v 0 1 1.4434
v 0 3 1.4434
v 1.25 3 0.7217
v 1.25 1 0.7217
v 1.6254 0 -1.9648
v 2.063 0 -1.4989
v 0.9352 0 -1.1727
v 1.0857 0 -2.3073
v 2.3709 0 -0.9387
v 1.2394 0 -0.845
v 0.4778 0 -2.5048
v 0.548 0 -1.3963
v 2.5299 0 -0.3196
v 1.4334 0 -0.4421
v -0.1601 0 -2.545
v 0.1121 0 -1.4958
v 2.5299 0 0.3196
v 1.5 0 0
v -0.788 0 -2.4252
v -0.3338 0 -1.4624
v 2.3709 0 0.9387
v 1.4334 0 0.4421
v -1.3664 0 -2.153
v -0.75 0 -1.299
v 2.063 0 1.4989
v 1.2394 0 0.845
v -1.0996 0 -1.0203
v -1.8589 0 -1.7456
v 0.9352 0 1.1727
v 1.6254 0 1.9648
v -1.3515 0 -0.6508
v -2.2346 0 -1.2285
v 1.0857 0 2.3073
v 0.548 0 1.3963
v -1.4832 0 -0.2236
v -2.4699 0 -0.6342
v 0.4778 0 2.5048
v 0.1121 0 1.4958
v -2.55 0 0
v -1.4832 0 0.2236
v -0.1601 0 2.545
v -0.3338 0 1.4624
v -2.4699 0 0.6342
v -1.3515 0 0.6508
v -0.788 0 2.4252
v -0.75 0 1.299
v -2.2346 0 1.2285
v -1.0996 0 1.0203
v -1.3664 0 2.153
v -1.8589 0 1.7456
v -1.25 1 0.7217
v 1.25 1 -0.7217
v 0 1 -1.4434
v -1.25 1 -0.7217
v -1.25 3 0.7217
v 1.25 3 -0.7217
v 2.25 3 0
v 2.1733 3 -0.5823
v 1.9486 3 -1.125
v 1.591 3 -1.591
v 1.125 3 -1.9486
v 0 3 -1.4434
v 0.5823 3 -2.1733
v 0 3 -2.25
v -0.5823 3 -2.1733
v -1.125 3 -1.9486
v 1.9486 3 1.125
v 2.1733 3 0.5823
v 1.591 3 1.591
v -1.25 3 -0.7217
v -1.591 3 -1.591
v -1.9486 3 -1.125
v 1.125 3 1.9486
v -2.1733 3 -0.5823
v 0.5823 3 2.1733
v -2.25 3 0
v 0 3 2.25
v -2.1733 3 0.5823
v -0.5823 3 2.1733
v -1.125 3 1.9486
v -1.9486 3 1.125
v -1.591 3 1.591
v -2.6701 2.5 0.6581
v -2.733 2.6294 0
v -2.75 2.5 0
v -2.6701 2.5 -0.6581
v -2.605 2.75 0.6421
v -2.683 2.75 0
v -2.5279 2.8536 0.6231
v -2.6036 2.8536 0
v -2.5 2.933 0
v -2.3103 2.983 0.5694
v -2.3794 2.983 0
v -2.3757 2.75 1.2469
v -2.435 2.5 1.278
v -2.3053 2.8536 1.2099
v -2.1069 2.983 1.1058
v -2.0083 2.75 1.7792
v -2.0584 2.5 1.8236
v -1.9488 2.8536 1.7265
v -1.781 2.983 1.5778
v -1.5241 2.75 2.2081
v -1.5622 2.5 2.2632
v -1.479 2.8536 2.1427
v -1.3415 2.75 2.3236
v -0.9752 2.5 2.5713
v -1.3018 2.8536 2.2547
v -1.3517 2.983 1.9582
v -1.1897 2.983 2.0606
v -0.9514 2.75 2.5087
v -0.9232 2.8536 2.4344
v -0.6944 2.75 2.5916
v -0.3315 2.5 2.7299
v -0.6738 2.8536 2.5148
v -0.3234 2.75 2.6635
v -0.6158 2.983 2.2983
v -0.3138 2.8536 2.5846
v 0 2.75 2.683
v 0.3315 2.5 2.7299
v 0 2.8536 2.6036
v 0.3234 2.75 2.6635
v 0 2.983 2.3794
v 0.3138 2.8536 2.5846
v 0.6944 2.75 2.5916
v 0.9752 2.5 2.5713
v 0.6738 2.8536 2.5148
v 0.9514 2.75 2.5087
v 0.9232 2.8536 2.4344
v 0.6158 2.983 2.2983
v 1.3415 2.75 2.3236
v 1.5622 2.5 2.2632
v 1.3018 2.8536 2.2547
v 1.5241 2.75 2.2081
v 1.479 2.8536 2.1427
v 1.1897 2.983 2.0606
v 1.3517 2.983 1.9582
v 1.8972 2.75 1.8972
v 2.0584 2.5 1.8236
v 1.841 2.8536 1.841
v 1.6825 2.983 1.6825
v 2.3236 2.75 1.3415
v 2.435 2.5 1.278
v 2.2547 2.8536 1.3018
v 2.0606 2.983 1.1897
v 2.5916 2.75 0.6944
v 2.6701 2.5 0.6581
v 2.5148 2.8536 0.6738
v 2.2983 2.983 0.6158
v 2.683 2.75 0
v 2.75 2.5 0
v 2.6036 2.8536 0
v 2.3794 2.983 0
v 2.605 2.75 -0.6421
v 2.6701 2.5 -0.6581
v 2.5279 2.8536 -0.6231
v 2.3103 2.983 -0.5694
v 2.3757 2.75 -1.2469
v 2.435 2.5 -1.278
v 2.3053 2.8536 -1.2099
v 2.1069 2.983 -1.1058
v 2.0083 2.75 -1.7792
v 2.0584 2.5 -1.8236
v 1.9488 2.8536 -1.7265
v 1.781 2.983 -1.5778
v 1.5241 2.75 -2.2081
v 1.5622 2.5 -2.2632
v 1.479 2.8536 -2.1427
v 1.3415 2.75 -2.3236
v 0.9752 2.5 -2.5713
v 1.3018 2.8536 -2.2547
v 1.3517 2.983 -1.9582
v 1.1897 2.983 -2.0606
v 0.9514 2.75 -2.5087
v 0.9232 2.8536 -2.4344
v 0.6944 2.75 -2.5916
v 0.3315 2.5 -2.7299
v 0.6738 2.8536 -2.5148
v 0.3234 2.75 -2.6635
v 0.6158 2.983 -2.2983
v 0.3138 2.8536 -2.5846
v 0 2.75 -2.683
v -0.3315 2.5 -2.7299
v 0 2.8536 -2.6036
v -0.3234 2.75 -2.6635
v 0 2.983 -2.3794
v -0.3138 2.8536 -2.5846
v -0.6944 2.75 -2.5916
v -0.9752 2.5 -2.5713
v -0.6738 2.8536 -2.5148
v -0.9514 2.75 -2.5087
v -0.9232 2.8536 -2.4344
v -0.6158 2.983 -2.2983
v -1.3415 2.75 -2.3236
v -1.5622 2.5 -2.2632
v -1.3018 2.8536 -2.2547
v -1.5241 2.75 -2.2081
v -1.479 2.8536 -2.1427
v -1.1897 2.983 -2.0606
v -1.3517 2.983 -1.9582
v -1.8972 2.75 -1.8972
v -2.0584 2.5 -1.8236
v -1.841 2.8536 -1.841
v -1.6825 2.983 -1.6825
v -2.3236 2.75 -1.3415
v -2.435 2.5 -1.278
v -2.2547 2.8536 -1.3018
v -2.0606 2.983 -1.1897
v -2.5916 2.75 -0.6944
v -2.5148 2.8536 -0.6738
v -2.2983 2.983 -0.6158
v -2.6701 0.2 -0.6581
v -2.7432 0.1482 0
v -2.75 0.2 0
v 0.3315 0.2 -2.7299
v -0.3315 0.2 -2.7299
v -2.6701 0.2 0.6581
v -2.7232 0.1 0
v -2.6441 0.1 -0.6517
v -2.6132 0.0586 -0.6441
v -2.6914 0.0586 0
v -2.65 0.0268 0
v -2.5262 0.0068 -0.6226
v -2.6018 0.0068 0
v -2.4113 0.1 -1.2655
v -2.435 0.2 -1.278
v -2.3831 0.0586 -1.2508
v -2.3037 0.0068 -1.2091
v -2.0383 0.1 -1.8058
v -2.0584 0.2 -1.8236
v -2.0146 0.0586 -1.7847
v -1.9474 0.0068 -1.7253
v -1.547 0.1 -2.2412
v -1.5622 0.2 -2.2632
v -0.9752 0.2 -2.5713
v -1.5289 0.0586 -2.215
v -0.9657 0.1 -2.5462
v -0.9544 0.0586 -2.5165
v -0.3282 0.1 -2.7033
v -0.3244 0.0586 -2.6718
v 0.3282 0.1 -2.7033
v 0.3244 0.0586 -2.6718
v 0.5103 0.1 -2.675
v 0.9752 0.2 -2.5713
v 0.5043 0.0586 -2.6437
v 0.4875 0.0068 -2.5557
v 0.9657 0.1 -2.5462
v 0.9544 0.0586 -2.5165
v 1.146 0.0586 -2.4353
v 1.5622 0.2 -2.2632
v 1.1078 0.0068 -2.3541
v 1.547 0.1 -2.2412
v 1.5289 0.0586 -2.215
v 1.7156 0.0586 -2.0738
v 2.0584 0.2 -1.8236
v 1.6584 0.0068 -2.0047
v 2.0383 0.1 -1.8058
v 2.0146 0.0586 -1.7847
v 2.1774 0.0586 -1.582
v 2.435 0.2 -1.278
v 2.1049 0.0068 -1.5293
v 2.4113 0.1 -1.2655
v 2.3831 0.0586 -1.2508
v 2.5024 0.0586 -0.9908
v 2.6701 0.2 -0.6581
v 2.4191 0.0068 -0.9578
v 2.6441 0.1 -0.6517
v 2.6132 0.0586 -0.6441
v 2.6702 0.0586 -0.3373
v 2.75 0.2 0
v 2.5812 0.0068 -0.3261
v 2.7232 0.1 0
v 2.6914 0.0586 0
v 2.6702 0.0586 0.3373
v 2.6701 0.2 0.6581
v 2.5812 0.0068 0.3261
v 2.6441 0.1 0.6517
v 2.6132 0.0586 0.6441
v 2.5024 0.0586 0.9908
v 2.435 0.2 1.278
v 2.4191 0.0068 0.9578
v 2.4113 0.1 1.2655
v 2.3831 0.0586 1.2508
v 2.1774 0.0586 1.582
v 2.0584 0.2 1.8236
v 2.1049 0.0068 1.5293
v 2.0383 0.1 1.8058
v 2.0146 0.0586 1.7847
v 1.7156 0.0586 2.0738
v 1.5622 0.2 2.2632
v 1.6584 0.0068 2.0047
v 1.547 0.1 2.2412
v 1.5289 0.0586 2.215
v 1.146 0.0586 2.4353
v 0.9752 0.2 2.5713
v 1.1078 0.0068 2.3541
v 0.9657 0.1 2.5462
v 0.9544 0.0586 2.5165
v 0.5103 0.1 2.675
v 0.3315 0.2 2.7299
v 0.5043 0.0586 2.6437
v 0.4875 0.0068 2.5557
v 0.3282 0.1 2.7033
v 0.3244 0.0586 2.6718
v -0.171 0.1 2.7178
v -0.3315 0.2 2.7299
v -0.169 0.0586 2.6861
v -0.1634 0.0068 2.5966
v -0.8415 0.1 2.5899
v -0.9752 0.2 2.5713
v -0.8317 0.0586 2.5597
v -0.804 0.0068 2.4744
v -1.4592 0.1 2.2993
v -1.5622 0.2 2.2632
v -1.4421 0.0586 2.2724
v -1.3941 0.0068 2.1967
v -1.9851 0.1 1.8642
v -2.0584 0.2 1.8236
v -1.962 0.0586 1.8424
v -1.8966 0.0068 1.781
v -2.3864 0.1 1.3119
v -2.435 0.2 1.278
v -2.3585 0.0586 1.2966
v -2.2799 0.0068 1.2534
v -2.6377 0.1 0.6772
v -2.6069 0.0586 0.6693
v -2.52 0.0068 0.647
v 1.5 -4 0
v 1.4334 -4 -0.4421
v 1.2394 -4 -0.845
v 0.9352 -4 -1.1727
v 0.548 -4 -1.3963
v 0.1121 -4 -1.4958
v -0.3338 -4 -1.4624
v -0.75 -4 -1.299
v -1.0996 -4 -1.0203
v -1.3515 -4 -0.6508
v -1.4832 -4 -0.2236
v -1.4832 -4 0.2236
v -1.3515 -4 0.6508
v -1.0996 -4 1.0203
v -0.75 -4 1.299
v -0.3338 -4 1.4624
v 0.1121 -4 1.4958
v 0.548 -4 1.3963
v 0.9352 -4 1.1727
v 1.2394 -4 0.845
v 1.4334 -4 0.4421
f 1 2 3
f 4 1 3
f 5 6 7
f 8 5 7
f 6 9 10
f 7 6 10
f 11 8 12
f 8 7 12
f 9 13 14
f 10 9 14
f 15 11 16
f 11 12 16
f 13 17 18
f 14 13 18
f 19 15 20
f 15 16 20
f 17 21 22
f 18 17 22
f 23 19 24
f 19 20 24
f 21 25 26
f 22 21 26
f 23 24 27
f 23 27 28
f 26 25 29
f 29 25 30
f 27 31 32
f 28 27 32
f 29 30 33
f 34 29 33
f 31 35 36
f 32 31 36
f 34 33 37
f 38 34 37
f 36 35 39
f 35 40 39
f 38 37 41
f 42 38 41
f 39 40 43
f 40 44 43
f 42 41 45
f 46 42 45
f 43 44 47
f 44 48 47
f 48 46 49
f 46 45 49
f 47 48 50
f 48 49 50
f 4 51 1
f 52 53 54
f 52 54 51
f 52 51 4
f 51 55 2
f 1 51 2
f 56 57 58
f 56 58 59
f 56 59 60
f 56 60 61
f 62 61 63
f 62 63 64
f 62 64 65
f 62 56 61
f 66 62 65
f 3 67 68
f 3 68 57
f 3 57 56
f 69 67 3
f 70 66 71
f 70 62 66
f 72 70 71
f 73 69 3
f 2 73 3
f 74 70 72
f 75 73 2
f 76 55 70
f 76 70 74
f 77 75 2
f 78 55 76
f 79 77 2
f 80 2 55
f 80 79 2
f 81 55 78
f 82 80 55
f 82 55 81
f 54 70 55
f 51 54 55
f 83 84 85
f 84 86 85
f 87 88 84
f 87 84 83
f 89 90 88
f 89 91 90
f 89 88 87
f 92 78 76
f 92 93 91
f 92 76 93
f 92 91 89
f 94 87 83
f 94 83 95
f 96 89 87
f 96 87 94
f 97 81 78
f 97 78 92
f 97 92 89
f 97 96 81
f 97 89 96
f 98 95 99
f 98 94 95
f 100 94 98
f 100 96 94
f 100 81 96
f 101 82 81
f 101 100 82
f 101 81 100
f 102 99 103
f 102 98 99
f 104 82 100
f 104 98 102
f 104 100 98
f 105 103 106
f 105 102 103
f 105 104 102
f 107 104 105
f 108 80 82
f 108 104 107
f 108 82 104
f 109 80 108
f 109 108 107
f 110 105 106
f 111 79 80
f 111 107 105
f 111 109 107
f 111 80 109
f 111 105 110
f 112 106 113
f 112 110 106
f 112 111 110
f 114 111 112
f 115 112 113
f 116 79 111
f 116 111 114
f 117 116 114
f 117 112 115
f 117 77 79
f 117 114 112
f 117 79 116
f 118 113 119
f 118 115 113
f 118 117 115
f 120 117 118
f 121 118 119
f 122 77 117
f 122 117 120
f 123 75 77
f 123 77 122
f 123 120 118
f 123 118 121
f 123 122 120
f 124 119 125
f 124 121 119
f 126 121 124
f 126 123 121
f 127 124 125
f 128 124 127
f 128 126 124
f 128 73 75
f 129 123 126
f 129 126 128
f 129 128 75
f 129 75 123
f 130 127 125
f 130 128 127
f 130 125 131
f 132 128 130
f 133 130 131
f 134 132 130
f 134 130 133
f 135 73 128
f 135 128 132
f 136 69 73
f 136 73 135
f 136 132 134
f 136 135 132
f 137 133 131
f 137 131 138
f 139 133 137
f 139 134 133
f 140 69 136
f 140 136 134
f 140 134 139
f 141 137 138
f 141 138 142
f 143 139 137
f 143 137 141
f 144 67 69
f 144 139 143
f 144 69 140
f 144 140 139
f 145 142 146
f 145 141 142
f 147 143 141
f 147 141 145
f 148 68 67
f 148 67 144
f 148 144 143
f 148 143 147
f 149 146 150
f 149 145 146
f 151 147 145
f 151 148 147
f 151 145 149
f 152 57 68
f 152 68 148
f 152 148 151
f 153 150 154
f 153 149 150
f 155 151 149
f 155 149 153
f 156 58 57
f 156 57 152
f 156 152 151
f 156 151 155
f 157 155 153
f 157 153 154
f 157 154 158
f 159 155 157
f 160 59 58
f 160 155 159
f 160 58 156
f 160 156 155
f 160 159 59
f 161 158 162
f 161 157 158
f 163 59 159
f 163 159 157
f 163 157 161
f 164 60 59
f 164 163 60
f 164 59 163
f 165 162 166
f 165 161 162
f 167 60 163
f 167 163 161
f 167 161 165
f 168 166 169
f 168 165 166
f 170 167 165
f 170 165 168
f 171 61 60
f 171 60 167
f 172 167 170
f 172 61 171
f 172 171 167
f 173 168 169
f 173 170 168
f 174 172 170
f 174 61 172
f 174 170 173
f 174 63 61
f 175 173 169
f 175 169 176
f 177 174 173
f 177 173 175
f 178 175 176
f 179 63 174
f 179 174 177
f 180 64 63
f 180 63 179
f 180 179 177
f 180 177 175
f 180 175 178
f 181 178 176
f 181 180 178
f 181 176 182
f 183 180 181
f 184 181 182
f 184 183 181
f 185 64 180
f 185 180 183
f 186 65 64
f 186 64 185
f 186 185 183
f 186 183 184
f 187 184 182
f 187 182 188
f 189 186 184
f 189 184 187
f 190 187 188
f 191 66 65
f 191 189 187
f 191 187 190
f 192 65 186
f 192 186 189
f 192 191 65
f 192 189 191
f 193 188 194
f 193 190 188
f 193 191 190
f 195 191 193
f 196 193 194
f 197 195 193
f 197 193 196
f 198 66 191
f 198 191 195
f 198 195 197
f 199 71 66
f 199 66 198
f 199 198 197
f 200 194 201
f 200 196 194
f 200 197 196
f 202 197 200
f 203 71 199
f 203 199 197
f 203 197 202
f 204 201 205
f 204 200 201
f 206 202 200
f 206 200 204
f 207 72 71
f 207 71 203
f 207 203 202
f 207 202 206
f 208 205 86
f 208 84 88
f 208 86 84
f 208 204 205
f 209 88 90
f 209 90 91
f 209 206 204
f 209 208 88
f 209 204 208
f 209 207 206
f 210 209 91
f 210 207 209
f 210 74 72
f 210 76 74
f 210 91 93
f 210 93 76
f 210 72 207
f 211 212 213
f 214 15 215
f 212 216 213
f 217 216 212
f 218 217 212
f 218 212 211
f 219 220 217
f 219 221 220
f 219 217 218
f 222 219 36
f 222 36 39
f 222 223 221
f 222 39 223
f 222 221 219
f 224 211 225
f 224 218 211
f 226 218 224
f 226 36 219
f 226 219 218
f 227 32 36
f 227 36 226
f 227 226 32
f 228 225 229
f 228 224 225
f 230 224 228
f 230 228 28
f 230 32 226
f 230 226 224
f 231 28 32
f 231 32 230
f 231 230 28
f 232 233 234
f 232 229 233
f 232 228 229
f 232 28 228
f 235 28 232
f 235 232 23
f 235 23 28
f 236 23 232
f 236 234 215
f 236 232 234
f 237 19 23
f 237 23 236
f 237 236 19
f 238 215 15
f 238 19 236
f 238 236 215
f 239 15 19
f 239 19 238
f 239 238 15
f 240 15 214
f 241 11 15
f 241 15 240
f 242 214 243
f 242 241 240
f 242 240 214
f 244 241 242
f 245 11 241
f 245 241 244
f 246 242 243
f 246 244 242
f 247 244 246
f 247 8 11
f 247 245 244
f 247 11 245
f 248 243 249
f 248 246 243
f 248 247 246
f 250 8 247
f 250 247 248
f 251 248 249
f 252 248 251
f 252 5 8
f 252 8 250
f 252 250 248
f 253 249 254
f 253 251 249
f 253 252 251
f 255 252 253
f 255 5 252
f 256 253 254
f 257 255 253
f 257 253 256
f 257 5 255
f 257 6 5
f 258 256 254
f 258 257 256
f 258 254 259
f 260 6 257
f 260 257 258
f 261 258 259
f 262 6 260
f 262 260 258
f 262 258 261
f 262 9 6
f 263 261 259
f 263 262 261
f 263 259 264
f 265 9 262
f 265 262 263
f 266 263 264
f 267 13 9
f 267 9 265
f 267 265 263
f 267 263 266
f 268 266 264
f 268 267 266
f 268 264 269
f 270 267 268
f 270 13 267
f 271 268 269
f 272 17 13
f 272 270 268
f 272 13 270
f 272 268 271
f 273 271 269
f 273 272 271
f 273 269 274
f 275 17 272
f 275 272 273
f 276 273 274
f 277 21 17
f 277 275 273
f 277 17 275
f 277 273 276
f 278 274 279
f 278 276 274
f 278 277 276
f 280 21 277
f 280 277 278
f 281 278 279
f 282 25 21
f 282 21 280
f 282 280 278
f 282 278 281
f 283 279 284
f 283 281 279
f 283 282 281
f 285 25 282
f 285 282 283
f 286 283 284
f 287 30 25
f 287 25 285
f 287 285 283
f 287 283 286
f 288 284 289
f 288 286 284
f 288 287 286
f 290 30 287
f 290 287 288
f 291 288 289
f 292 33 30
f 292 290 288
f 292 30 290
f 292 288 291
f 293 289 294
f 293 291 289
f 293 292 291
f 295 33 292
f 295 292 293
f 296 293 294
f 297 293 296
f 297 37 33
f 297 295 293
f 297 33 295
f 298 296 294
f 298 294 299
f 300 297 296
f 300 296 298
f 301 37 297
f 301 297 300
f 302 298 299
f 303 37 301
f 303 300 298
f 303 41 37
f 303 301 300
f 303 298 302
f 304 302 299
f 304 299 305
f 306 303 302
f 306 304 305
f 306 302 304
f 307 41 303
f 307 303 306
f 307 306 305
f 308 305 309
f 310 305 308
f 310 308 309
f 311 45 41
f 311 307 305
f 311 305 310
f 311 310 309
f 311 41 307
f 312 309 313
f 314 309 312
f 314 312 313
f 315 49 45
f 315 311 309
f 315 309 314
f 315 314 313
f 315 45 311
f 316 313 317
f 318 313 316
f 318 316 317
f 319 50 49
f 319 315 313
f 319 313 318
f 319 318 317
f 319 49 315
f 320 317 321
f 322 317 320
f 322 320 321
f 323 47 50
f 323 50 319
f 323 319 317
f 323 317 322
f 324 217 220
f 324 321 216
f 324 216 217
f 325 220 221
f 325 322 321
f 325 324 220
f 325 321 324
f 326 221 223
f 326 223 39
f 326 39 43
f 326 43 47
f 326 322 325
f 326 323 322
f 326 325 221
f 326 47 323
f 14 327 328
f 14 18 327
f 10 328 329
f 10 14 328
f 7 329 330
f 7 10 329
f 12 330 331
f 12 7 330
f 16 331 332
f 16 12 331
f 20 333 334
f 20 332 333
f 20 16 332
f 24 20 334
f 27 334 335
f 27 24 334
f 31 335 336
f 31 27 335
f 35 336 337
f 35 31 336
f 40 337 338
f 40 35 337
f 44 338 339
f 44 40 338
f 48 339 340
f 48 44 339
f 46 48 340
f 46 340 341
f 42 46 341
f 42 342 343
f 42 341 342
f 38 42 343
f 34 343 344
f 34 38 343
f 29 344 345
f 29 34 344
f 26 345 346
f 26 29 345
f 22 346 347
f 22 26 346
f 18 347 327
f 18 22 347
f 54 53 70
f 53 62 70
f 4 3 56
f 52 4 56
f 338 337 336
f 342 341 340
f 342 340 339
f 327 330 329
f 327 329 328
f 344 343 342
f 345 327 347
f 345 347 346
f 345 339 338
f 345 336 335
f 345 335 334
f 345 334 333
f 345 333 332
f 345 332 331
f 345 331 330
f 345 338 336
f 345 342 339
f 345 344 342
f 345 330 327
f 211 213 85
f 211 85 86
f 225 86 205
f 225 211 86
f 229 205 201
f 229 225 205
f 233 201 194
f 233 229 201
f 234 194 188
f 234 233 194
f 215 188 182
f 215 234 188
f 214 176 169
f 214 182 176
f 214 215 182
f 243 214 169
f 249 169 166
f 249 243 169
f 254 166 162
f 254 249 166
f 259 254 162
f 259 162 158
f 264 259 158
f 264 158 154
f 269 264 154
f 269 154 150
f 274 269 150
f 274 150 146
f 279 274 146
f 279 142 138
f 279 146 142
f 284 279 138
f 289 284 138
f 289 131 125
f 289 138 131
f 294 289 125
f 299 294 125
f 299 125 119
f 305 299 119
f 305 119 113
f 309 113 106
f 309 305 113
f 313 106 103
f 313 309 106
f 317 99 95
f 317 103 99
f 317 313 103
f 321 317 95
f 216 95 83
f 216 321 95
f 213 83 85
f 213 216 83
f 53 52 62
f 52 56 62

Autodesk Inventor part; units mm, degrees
ref_plane "YZ Plane" through (0, 0, 0) normal (1, 0, 0) x (0, 1, 0)
ref_plane "XZ Plane" through (0, 0, 0) normal (0, 1, 0) x (-1, 0, 0)
ref_plane "XY Plane" through (0, 0, 0) normal (0, 0, 1) x (1, 0, 0)
sketch "スケッチ1" plane through (0, 0, 0) normal (0, 1, 0) x (-1, 0, 0)
  circle A0 centre (0, 0) radius 2.75
  dimension "d0" = 5.5
extrude "押し出し1" add sketch "スケッチ1" along normal blind 3
sketch "スケッチ2" plane through (0, 0, 0) normal (0, -1, 0) x (1, 0, 0)
  circle A0 centre (0, 0) radius 1.5
  dimension "d3" = 3
extrude "押し出し2" add sketch "スケッチ2" along normal blind 4
fillet "フィレット1" radius 0.5 1 edges at (2.75, 3, 0)
fillet "フィレット1" radius 0.2 1 edges at (2.75, 0, 0)
sketch "スケッチ3" plane through (0, 3, 0) normal (0, 1, 0) x (1, 0, 0)
  line L0 (0, 1.4434) -> (-1.25, 0.7217)
  line L1 (-1.25, 0.7217) -> (-1.25, -0.7217)
  line L2 (-1.25, -0.7217) -> (0, -1.4434)
  line L3 (0, -1.4434) -> (1.25, -0.7217)
  line L4 (1.25, -0.7217) -> (1.25, 0.7217)
  line L5 (1.25, 0.7217) -> (0, 1.4434)
  line L6 (0, 1.4434) -> (0, -1.4434) construction
  circle A0 centre (0, 0) radius 1.4434 construction
  dimension "d12" = 2.5
extrude "押し出し3" cut sketch "スケッチ3" against normal blind 2
thread "ねじ1" size "M3x0.5" class "6g" standard "ANSI Metric M Profile" full length
properties part number "M3-CapScrew"
